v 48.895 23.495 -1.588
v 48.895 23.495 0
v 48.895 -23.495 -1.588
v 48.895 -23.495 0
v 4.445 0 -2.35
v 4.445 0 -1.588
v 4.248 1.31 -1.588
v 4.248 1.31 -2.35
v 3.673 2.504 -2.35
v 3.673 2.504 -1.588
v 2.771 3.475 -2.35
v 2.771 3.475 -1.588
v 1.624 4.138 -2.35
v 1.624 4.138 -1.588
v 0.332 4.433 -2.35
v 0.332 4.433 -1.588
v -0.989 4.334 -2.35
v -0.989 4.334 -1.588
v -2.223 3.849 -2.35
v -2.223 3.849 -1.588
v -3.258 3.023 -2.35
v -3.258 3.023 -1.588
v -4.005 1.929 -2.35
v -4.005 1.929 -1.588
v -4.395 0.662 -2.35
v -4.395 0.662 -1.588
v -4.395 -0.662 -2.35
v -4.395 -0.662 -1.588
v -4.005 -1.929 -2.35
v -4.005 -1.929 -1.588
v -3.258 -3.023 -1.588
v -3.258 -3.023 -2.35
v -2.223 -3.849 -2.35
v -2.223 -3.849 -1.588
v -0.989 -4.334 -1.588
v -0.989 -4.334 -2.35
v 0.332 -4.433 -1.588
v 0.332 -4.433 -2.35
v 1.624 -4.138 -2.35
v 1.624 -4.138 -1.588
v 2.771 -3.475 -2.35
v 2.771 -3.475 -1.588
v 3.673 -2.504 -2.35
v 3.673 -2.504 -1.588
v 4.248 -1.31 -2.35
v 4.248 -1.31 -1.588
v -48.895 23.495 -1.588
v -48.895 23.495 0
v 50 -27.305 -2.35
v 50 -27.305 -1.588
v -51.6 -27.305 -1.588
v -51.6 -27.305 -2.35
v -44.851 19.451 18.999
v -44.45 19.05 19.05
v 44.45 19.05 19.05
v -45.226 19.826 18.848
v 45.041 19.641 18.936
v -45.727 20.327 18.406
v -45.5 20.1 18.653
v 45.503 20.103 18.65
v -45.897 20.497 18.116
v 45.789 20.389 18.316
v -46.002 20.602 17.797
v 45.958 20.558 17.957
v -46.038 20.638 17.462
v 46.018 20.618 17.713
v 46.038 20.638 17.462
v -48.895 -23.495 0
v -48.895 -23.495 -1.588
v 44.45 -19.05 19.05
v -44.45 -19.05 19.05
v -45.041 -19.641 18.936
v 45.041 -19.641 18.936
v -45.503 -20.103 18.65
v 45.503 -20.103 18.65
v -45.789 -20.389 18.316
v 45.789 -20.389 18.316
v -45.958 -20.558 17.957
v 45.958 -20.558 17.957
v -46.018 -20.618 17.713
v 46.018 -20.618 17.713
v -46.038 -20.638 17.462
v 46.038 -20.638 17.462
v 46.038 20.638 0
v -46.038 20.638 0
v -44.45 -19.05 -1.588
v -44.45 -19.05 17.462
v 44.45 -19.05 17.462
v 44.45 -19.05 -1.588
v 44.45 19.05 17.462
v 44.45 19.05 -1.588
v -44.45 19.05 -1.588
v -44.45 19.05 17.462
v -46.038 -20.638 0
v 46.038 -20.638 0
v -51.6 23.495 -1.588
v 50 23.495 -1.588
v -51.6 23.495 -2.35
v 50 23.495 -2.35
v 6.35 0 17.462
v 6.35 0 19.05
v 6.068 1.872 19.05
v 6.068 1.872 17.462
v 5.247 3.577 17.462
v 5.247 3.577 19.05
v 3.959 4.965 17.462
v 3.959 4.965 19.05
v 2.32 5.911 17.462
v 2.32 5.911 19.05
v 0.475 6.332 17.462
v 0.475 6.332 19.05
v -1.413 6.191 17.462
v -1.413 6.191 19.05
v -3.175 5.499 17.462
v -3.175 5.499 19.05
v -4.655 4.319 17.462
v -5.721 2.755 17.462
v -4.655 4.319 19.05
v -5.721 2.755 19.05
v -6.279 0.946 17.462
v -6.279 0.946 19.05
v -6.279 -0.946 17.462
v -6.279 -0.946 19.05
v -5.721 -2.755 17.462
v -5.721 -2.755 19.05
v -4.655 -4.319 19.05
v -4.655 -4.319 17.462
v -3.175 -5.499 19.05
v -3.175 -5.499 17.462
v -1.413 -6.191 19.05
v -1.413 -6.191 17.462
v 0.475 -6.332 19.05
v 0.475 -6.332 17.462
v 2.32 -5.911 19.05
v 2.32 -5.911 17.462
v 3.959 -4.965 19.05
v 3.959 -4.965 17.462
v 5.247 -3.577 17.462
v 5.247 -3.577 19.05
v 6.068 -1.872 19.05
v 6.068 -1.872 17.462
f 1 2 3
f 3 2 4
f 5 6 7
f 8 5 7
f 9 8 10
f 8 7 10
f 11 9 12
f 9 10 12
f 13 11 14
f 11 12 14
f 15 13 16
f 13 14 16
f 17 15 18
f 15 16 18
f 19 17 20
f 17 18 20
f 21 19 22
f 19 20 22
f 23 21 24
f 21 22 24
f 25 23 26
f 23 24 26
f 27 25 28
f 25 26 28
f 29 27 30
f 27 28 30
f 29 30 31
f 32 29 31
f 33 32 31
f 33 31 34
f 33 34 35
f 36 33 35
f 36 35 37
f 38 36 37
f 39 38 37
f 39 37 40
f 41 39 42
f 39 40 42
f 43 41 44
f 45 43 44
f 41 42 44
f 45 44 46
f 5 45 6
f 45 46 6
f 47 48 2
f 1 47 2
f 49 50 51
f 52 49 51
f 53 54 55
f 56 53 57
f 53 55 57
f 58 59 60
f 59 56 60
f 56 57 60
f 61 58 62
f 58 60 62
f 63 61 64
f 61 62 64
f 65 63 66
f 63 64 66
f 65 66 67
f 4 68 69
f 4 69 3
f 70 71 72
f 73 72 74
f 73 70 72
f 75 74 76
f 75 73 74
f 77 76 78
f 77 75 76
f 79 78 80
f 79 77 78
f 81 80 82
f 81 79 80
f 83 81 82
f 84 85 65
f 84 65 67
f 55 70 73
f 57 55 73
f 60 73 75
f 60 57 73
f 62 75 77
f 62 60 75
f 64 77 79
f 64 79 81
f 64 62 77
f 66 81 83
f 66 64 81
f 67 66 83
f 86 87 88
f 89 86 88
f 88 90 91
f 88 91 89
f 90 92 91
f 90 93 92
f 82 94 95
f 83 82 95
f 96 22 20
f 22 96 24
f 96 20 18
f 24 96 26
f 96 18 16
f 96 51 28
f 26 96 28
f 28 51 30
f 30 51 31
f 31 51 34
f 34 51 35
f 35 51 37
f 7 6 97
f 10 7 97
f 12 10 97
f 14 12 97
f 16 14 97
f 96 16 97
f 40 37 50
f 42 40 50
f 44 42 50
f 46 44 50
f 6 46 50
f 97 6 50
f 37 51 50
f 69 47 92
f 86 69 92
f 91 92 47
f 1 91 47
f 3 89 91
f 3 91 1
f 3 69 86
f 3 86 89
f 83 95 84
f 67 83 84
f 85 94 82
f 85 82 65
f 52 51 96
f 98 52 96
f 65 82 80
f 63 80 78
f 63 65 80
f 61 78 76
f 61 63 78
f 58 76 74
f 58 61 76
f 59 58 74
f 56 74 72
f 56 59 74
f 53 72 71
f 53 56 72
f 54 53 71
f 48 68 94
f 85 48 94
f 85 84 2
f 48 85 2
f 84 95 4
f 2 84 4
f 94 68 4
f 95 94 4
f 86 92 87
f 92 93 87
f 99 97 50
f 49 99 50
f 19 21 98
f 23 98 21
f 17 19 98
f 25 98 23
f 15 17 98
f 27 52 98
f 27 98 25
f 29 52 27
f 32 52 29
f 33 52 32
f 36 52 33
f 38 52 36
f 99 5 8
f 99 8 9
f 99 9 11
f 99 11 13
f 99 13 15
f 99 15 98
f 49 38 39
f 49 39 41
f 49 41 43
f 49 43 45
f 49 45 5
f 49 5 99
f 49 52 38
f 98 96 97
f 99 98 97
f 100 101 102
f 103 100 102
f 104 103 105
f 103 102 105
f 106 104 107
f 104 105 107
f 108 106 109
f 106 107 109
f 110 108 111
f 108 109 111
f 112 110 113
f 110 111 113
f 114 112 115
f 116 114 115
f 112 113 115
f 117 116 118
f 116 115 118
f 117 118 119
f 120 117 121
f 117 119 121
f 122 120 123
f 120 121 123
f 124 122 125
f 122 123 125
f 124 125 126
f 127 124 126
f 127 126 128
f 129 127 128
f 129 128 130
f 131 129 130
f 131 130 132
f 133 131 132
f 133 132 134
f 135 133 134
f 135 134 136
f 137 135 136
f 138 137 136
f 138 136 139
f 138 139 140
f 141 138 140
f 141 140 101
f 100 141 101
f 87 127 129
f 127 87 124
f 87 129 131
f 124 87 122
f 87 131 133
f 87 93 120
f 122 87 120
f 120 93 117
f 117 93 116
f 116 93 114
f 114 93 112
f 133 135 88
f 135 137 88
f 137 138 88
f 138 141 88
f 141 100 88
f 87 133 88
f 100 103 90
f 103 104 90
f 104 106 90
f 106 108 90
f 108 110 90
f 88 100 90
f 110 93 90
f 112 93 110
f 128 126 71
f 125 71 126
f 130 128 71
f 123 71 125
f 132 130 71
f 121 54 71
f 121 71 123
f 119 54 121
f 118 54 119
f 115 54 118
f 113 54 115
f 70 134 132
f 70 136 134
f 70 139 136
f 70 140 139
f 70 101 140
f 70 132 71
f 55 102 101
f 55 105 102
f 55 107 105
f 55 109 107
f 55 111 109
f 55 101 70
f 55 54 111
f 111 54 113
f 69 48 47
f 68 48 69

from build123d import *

# Parameters (mm, degrees)
F0_W      = 88.9
F0_H      = 38.1
F1_DEPTH  = 17.4625
F2_T      = 1.5875
F3_W      = 97.79
F3_H      = 46.99
F3_W_2    = 88.9
F3_H_2    = 38.1
F4_DEPTH  = 1.5875
F5_R      = 1.5875
F6_R      = 6.35
F7_DEPTH  = 25.4
F8_W      = 97.79
F8_H      = 46.99
F8_W_2    = 88.9
F8_H_2    = 38.1
F9_DEPTH  = 0.762
F10_R     = 4.445
F11_DEPTH = 0.762


with BuildPart() as f1:
    # F0 (on Top) → F1 (new body)
    with BuildSketch(Plane.XY):
        Rectangle(F0_W, F0_H)
    extrude(amount=F1_DEPTH)

    # F2
    f2_openings = [f1.faces().sort_by_distance(p)[0] for p in [
        (0, 0, 0),
    ]]
    offset(amount=F2_T, openings=f2_openings, kind=Kind.INTERSECTION)

    # F3 (on face) → F4 (join)
    with BuildSketch(Plane(origin=(0, 0, 0), x_dir=(1, 0, 0), z_dir=(0, 0, -1))):
        Rectangle(F3_W, F3_H)
        Rectangle(F3_W_2, F3_H_2, mode=Mode.SUBTRACT)
    extrude(amount=F4_DEPTH)

    # F5
    f5_edges = [f1.edges().sort_by_distance(p)[0] for p in [
        (46.0375, 0, 19.05),
        (0, -20.6375, 19.05),
        (-46.0375, 0, 19.05),
        (0, 20.6375, 19.05),
    ]]
    fillet(f5_edges, radius=F5_R)

    # F6 (on face) → F7 (cut)
    with BuildSketch(Plane.XY.offset(19.05)):
        Circle(F6_R)
    extrude(amount=-F7_DEPTH, mode=Mode.SUBTRACT)


with BuildPart() as f9:
    # F8 (on face) → F9 (new body)
    with BuildSketch(Plane(origin=(0, 0, -1.5875), x_dir=(1, 0, 0), z_dir=(0, 0, -1))):
        Polygon((49.9999, 27.305), (-51.6001, 27.305), (-51.6001, -23.495), (-48.895, -23.495), (-48.895, 23.495), (48.895, 23.495), (48.895, -23.495), (49.9999, -23.495), align=None)
        Rectangle(F8_W, F8_H)
        Rectangle(F8_W_2, F8_H_2, mode=Mode.SUBTRACT)
        Rectangle(F8_W_2, F8_H_2)
    extrude(amount=F9_DEPTH)

    # F10 (on face) → F11 (cut, through all)
    with BuildSketch(Plane.XY.offset(-1.5875)):
        Circle(F10_R)
    extrude(amount=-F11_DEPTH, mode=Mode.SUBTRACT)


solid = Compound([f1.part, f9.part])
